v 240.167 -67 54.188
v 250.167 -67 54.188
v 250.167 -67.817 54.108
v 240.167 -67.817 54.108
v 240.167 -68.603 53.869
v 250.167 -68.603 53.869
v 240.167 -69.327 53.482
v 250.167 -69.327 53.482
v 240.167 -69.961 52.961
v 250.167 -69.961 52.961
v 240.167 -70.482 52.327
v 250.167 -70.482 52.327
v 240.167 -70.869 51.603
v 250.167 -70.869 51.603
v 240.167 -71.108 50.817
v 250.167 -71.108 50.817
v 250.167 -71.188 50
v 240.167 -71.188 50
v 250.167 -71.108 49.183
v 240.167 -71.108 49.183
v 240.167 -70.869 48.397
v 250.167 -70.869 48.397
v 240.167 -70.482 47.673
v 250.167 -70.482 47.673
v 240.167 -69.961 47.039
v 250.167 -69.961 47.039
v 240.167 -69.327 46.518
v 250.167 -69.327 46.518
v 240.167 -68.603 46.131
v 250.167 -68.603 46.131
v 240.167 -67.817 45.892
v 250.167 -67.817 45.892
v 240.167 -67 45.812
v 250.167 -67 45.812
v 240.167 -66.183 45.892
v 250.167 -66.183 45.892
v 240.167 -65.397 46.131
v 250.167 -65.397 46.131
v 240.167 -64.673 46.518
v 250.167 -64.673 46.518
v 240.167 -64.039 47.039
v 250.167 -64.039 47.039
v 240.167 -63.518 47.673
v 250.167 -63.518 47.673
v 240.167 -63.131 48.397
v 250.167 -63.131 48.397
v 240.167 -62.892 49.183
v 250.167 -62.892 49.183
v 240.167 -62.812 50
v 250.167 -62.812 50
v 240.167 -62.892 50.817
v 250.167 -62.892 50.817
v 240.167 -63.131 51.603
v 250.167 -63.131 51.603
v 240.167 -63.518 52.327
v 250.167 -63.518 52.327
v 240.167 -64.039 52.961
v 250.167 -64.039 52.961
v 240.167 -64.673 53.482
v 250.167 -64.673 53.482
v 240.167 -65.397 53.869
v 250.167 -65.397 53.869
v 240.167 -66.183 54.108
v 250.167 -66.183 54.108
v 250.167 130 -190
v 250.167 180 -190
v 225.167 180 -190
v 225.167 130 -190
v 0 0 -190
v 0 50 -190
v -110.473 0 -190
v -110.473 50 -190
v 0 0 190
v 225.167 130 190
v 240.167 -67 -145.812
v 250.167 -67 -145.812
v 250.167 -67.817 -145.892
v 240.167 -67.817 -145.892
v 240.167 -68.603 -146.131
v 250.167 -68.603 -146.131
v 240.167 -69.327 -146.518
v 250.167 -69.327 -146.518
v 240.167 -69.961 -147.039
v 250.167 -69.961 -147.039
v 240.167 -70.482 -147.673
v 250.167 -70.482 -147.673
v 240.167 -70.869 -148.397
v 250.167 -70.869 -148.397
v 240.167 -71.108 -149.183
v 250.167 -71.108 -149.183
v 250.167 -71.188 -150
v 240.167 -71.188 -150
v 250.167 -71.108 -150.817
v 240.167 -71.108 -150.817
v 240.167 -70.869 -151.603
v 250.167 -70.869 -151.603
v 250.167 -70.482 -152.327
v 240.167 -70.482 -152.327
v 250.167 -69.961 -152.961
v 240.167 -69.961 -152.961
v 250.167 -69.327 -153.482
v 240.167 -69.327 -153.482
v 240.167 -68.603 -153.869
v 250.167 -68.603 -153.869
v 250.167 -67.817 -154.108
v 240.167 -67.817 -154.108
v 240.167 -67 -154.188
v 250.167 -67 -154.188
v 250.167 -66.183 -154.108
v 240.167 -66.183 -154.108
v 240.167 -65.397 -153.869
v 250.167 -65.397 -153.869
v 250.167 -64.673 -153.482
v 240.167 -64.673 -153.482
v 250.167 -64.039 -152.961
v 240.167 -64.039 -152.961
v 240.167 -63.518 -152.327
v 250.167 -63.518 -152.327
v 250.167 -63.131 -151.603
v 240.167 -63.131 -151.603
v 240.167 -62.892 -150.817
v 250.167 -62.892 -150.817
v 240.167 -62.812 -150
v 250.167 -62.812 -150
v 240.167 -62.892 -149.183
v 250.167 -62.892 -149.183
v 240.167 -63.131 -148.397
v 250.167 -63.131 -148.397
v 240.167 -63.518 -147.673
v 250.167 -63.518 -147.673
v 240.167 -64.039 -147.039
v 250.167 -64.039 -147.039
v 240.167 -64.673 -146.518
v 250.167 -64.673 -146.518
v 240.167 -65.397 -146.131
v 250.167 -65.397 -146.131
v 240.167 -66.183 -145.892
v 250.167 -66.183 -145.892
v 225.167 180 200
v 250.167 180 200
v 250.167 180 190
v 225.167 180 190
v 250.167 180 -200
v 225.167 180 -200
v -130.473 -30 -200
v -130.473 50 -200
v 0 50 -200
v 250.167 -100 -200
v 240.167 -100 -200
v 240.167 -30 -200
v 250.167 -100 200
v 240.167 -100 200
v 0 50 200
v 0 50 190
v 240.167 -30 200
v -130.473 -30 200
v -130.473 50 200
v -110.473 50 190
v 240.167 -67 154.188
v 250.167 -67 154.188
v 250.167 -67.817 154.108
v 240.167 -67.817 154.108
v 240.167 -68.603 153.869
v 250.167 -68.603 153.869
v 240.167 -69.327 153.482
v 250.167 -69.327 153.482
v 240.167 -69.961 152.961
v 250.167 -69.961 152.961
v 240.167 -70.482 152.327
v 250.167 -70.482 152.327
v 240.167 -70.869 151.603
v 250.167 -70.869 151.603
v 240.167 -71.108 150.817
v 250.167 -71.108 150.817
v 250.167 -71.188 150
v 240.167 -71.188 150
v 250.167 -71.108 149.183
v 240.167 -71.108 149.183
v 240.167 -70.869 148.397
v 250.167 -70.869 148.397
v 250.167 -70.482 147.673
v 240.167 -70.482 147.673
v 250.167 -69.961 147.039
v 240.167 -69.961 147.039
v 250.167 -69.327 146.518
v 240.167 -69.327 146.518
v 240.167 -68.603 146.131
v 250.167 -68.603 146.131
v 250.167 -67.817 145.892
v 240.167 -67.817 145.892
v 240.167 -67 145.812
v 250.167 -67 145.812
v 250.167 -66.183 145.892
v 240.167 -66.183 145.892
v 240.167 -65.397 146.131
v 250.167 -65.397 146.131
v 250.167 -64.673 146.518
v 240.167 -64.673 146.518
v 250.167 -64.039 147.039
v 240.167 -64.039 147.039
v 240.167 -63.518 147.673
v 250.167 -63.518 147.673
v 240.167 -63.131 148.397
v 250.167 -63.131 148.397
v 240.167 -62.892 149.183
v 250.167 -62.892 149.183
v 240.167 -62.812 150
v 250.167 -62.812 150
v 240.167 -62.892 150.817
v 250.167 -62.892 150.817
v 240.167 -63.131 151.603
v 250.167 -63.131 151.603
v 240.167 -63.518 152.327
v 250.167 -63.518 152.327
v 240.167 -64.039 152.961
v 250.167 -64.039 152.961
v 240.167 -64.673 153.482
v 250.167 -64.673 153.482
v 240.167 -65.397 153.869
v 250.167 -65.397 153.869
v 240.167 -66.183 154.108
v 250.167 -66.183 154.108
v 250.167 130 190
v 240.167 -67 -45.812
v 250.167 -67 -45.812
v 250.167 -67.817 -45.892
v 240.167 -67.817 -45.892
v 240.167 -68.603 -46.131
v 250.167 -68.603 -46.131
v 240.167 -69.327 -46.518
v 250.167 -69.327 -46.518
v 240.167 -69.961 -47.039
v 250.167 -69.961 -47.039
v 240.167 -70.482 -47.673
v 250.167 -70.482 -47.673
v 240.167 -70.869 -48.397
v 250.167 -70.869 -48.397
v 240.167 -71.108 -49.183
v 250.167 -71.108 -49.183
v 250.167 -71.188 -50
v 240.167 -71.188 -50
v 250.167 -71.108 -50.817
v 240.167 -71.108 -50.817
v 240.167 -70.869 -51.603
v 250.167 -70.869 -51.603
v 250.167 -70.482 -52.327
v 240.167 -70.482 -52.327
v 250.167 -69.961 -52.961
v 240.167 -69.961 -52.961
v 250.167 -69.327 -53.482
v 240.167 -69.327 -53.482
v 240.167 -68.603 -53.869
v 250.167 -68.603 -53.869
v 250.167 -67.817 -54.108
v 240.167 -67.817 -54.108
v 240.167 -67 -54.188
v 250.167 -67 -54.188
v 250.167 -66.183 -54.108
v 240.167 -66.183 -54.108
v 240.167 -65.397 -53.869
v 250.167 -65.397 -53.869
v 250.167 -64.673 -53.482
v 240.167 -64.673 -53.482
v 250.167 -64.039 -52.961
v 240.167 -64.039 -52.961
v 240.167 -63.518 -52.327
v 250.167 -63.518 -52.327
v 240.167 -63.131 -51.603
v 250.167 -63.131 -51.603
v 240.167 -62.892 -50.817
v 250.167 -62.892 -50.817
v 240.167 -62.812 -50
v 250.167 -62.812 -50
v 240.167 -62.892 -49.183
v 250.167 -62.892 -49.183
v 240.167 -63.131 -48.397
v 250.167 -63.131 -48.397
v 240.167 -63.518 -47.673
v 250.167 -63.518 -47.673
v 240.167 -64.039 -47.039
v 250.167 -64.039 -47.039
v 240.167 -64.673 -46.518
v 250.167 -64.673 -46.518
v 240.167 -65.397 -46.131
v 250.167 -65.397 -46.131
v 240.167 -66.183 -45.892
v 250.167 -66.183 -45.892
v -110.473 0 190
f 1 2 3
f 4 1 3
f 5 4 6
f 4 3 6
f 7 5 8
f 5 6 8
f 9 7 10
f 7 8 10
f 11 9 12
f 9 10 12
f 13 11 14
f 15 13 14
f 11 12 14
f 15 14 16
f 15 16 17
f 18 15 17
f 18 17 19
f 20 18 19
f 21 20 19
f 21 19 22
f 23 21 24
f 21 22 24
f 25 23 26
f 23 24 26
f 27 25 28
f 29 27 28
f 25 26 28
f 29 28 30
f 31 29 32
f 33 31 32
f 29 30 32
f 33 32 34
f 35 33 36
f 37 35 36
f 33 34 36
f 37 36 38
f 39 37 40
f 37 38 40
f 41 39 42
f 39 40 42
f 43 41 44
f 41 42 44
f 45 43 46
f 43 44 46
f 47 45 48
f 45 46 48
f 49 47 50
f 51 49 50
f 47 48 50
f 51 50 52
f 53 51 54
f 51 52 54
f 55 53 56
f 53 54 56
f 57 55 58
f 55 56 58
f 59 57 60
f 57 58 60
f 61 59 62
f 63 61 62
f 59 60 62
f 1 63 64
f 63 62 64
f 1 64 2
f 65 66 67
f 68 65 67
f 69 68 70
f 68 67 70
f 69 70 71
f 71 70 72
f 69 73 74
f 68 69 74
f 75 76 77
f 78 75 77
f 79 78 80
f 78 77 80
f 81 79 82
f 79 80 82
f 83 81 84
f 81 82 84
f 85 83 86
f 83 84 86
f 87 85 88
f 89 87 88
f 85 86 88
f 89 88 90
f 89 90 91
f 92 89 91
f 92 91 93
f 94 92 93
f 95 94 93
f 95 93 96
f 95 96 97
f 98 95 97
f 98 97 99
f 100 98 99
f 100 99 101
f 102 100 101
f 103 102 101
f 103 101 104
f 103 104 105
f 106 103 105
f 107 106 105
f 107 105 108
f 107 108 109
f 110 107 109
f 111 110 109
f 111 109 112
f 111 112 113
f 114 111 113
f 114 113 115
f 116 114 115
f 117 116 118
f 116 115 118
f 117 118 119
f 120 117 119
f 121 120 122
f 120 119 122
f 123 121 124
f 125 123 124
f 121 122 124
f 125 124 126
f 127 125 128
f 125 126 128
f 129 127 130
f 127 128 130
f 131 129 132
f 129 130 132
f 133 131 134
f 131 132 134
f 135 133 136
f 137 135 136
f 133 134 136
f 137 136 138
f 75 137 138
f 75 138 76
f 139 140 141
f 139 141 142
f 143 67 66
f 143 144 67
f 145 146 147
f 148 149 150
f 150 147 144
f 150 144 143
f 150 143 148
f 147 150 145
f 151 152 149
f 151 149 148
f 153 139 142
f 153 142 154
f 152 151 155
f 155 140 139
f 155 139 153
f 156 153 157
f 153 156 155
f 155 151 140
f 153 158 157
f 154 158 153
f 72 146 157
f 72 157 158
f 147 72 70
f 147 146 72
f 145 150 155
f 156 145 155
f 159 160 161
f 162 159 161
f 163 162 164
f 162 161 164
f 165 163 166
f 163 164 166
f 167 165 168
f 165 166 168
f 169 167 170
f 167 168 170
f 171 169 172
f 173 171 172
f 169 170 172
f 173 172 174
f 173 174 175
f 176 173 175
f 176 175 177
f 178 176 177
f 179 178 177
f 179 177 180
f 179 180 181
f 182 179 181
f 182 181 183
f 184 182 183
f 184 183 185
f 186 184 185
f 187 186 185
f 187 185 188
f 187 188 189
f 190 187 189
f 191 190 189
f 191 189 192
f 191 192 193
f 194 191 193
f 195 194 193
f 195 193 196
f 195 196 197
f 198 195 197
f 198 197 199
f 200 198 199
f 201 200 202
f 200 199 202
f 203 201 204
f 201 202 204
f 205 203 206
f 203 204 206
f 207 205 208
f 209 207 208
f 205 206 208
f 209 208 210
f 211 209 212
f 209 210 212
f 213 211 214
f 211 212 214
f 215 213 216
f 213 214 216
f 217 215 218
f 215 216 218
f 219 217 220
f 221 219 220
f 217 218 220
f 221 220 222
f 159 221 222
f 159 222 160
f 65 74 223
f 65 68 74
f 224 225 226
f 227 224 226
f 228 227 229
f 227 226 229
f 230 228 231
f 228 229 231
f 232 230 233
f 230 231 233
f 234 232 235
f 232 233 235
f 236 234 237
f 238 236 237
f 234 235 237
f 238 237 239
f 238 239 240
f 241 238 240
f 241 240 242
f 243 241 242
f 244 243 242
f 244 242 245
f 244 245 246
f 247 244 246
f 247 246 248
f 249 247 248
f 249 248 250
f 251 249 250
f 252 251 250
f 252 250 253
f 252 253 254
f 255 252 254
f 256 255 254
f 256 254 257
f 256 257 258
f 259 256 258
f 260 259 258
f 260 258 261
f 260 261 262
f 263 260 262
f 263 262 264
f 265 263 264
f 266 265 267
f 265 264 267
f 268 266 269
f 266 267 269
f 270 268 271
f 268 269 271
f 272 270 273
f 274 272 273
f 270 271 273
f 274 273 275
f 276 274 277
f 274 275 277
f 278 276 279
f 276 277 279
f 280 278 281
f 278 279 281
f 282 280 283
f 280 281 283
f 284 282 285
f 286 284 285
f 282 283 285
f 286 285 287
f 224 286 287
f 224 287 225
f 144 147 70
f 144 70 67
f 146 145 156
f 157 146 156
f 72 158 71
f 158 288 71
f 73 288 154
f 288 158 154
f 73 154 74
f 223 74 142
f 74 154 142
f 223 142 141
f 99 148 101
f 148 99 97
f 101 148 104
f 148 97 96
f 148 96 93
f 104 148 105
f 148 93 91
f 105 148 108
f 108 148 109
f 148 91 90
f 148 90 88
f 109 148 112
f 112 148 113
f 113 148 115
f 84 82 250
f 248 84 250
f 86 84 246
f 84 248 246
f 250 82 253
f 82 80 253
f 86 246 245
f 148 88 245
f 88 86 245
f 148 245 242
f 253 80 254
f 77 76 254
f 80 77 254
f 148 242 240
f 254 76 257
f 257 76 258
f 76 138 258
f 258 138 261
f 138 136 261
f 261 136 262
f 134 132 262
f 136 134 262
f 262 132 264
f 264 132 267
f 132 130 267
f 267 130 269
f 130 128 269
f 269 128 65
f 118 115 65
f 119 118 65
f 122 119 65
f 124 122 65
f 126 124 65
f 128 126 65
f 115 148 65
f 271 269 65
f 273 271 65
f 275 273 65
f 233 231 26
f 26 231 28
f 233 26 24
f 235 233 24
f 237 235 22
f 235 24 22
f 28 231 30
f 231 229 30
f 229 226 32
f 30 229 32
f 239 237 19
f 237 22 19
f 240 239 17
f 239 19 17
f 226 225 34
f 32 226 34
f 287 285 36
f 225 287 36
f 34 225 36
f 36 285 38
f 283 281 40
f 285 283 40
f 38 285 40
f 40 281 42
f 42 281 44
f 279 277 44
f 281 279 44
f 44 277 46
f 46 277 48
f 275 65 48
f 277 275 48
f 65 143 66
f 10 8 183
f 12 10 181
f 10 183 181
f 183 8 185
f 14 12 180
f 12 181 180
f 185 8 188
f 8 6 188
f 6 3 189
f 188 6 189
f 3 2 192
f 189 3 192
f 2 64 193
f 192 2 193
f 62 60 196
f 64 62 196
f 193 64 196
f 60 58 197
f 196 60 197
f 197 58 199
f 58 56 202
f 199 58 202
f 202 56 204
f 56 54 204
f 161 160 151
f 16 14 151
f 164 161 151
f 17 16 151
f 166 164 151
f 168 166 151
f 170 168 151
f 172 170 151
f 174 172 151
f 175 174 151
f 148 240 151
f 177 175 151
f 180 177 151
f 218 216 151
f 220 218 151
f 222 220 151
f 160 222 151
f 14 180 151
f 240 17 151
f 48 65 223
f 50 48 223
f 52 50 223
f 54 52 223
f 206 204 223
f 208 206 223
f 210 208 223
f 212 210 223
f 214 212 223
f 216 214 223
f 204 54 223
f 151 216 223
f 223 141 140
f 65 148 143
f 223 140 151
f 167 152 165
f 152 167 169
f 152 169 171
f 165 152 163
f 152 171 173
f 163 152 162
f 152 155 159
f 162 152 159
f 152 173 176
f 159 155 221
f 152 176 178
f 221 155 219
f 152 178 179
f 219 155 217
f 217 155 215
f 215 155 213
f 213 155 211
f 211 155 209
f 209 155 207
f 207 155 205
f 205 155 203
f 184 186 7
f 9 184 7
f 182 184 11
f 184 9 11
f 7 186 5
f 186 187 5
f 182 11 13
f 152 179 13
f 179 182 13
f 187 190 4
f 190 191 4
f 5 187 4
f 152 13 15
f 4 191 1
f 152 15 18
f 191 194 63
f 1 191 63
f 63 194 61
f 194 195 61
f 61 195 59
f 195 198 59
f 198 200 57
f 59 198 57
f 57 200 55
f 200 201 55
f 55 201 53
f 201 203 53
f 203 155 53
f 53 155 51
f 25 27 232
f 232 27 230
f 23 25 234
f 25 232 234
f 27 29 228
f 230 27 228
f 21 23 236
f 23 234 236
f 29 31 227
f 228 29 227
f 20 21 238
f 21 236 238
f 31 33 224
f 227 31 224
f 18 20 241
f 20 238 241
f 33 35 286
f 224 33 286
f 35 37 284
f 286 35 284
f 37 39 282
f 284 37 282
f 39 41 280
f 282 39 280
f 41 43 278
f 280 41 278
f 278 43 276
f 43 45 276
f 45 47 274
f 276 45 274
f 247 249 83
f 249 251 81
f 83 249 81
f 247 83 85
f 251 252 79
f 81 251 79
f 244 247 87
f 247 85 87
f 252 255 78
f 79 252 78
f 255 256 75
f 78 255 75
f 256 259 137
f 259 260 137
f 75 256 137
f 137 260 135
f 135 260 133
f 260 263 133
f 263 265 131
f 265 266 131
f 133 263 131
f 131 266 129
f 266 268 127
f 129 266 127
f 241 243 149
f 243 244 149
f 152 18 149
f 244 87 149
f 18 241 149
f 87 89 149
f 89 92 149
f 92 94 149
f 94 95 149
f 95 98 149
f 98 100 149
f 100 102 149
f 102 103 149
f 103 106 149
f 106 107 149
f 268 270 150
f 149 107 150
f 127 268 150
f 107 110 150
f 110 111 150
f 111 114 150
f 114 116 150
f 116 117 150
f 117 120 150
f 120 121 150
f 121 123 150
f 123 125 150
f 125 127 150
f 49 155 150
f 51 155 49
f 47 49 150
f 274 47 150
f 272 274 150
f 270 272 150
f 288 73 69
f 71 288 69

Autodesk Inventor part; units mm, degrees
ref_plane "YZ Plane" through (0, 0, 0) normal (1, 0, 0) x (0, 1, 0)
ref_plane "XZ Plane" through (0, 0, 0) normal (0, 1, 0) x (-1, 0, 0)
sketch "Sketch1" plane through (0, 0, 0) normal (0, 0, 1) x (1, 0, 0)
  line L0 (0, 0) -> (225.1666, 130)
  line L1 (0, 0) -> (260, 0) construction
  line L2 (225.1666, 130) -> (250.1666, 130)
  line L3 (250.1666, 130) -> (250.1666, 0)
  line L4 (250.1666, 0) -> (0, 0)
  dimension "d4" = 30
  dimension "d5" = 260
  dimension "d6" = 25
extrude "Extrusion1" add sketch "Sketch1" along normal blind 200 and the other way blind 200
sketch "Sketch8" plane through (250.1666, 0, -200) normal (0, -1, 0) x (1, 0, 0)
  line L0 (0, 0) -> (-250.1666, 0) projected
  line L1 (0, 400) -> (0, 390) projected
  line L2 (-260.64, 0) -> (0, 0)
  line L3 (0, 0) -> (0, 400)
  line L4 (0, 400) -> (-260.64, 400)
  line L5 (-260.64, 400) -> (-260.64, 0)
  point P0 (-250.1666, 200)
extrude "Extrusion8" add sketch "Sketch8" along normal blind 30
sketch "Sketch9" plane through (-10.4734, -30, -200) normal (-1, 0, 0) x (0, 0, 1)
  line L0 (0, 160) -> (0, 0) projected
  line L1 (400, 160) -> (400, 0) projected
  line L2 (0, 0) -> (400, 0)
  line L3 (400, 0) -> (400, 30)
  line L4 (400, 30) -> (0, 30)
  line L5 (0, 30) -> (0, 0)
  point P0 (200, 30)
  point P1 (0, 229.8807)
  point P2 (400, 229.8807)
extrude "Extrusion9" add sketch "Sketch9" along normal blind 120
sketch "Sketch10" plane through (-130.4734, 0, -200) normal (0, 1, 0) x (1, 0, 0)
  line L0 (380.64, -400) -> (0, -400) projected
  line L1 (380.64, 0) -> (0, 0) projected
  line L2 (0, -400) -> (20, -400)
  line L3 (20, -400) -> (20, 0)
  line L4 (20, 0) -> (0, 0)
  line L5 (0, 0) -> (0, -400)
  point P0 (130.4734, -200)
  dimension "d32" = 20
extrude "Extrusion10" add sketch "Sketch10" along normal blind 50
sketch "Sketch11" plane through (0, 0, -200) normal (0, 0, -1) x (-1, 0, 0)
  line L0 (-250.1666, 130) -> (-250.1666, -30) projected
  line L1 (-250.1666, 130) -> (-250.1666, 180)
  line L2 (0, 0) -> (-225.1666, 130) projected
  line L3 (0, 0) -> (0, 50)
  line L4 (110.4734, 0) -> (110.4734, 50) projected
  line L5 (0, 50) -> (110.4734, 50)
  line L6 (0, 50) -> (-225.1666, 180)
  line L7 (-225.1666, 180) -> (-250.1666, 180)
  line L8 (-225.1666, 130) -> (-225.1666, 180)
  line L9 (-225.1666, 130) -> (-250.1666, 130) projected
  line L10 (0, 0) -> (110.4734, 0) projected
  dimension "d35" = 50
  dimension "d36" = 50
extrude "Extrusion11" add sketch "Sketch11" against normal blind 10
ref_plane "Work Plane2" through (250.1666, 130, 0) normal (0, 0, -1) x (-1, 0, 0)
ref_plane "Work Plane1" through (250.1666, 130, 5) normal (0, 0, -1) x (-1, 0, 0)
mirror "Mirror1" about plane through (250.1666, 130, 0) normal (0, 0, -1) of "Extrusion11"
sketch "Sketch12" plane through (250.1666, -30, -200) normal (0, -1, 0) x (1, 0, 0)
  line L0 (0, 400) -> (-380.64, 400) projected
  line L1 (0, 400) -> (-10, 400)
  line L2 (-10, 400) -> (-10, 0)
  line L3 (-10, 0) -> (0, 0)
  line L4 (0, 0) -> (0, 400)
  point P0 (-250.1666, 200)
  dimension "d40" = 10
extrude "Extrusion12" add sketch "Sketch12" along normal blind 70
sketch "Sketch13" plane through (240.1666, -30, -200) normal (-1, 0, 0) x (0, 0, 1)
  line L0 (0, 0) -> (0, -70) projected
  line L1 (0, 0) -> (400, 0) projected
  point P0 (200, 30)
  point P1 (50, -37)
  dimension "d43" = 50
  dimension "d44" = 37
hole "Hole1" at (240.1666, -67, -150) direction (1, 0, 0) diameter 8.376 depth 27.3 tip angle 118 thread size "M10x1.5" class "6H" standard "ISO Metric profile"
pattern_linear "Rectangular Pattern1" count 4 spacing 100 along (0, 0, 1) of "Hole1"
properties part number "rampa"
